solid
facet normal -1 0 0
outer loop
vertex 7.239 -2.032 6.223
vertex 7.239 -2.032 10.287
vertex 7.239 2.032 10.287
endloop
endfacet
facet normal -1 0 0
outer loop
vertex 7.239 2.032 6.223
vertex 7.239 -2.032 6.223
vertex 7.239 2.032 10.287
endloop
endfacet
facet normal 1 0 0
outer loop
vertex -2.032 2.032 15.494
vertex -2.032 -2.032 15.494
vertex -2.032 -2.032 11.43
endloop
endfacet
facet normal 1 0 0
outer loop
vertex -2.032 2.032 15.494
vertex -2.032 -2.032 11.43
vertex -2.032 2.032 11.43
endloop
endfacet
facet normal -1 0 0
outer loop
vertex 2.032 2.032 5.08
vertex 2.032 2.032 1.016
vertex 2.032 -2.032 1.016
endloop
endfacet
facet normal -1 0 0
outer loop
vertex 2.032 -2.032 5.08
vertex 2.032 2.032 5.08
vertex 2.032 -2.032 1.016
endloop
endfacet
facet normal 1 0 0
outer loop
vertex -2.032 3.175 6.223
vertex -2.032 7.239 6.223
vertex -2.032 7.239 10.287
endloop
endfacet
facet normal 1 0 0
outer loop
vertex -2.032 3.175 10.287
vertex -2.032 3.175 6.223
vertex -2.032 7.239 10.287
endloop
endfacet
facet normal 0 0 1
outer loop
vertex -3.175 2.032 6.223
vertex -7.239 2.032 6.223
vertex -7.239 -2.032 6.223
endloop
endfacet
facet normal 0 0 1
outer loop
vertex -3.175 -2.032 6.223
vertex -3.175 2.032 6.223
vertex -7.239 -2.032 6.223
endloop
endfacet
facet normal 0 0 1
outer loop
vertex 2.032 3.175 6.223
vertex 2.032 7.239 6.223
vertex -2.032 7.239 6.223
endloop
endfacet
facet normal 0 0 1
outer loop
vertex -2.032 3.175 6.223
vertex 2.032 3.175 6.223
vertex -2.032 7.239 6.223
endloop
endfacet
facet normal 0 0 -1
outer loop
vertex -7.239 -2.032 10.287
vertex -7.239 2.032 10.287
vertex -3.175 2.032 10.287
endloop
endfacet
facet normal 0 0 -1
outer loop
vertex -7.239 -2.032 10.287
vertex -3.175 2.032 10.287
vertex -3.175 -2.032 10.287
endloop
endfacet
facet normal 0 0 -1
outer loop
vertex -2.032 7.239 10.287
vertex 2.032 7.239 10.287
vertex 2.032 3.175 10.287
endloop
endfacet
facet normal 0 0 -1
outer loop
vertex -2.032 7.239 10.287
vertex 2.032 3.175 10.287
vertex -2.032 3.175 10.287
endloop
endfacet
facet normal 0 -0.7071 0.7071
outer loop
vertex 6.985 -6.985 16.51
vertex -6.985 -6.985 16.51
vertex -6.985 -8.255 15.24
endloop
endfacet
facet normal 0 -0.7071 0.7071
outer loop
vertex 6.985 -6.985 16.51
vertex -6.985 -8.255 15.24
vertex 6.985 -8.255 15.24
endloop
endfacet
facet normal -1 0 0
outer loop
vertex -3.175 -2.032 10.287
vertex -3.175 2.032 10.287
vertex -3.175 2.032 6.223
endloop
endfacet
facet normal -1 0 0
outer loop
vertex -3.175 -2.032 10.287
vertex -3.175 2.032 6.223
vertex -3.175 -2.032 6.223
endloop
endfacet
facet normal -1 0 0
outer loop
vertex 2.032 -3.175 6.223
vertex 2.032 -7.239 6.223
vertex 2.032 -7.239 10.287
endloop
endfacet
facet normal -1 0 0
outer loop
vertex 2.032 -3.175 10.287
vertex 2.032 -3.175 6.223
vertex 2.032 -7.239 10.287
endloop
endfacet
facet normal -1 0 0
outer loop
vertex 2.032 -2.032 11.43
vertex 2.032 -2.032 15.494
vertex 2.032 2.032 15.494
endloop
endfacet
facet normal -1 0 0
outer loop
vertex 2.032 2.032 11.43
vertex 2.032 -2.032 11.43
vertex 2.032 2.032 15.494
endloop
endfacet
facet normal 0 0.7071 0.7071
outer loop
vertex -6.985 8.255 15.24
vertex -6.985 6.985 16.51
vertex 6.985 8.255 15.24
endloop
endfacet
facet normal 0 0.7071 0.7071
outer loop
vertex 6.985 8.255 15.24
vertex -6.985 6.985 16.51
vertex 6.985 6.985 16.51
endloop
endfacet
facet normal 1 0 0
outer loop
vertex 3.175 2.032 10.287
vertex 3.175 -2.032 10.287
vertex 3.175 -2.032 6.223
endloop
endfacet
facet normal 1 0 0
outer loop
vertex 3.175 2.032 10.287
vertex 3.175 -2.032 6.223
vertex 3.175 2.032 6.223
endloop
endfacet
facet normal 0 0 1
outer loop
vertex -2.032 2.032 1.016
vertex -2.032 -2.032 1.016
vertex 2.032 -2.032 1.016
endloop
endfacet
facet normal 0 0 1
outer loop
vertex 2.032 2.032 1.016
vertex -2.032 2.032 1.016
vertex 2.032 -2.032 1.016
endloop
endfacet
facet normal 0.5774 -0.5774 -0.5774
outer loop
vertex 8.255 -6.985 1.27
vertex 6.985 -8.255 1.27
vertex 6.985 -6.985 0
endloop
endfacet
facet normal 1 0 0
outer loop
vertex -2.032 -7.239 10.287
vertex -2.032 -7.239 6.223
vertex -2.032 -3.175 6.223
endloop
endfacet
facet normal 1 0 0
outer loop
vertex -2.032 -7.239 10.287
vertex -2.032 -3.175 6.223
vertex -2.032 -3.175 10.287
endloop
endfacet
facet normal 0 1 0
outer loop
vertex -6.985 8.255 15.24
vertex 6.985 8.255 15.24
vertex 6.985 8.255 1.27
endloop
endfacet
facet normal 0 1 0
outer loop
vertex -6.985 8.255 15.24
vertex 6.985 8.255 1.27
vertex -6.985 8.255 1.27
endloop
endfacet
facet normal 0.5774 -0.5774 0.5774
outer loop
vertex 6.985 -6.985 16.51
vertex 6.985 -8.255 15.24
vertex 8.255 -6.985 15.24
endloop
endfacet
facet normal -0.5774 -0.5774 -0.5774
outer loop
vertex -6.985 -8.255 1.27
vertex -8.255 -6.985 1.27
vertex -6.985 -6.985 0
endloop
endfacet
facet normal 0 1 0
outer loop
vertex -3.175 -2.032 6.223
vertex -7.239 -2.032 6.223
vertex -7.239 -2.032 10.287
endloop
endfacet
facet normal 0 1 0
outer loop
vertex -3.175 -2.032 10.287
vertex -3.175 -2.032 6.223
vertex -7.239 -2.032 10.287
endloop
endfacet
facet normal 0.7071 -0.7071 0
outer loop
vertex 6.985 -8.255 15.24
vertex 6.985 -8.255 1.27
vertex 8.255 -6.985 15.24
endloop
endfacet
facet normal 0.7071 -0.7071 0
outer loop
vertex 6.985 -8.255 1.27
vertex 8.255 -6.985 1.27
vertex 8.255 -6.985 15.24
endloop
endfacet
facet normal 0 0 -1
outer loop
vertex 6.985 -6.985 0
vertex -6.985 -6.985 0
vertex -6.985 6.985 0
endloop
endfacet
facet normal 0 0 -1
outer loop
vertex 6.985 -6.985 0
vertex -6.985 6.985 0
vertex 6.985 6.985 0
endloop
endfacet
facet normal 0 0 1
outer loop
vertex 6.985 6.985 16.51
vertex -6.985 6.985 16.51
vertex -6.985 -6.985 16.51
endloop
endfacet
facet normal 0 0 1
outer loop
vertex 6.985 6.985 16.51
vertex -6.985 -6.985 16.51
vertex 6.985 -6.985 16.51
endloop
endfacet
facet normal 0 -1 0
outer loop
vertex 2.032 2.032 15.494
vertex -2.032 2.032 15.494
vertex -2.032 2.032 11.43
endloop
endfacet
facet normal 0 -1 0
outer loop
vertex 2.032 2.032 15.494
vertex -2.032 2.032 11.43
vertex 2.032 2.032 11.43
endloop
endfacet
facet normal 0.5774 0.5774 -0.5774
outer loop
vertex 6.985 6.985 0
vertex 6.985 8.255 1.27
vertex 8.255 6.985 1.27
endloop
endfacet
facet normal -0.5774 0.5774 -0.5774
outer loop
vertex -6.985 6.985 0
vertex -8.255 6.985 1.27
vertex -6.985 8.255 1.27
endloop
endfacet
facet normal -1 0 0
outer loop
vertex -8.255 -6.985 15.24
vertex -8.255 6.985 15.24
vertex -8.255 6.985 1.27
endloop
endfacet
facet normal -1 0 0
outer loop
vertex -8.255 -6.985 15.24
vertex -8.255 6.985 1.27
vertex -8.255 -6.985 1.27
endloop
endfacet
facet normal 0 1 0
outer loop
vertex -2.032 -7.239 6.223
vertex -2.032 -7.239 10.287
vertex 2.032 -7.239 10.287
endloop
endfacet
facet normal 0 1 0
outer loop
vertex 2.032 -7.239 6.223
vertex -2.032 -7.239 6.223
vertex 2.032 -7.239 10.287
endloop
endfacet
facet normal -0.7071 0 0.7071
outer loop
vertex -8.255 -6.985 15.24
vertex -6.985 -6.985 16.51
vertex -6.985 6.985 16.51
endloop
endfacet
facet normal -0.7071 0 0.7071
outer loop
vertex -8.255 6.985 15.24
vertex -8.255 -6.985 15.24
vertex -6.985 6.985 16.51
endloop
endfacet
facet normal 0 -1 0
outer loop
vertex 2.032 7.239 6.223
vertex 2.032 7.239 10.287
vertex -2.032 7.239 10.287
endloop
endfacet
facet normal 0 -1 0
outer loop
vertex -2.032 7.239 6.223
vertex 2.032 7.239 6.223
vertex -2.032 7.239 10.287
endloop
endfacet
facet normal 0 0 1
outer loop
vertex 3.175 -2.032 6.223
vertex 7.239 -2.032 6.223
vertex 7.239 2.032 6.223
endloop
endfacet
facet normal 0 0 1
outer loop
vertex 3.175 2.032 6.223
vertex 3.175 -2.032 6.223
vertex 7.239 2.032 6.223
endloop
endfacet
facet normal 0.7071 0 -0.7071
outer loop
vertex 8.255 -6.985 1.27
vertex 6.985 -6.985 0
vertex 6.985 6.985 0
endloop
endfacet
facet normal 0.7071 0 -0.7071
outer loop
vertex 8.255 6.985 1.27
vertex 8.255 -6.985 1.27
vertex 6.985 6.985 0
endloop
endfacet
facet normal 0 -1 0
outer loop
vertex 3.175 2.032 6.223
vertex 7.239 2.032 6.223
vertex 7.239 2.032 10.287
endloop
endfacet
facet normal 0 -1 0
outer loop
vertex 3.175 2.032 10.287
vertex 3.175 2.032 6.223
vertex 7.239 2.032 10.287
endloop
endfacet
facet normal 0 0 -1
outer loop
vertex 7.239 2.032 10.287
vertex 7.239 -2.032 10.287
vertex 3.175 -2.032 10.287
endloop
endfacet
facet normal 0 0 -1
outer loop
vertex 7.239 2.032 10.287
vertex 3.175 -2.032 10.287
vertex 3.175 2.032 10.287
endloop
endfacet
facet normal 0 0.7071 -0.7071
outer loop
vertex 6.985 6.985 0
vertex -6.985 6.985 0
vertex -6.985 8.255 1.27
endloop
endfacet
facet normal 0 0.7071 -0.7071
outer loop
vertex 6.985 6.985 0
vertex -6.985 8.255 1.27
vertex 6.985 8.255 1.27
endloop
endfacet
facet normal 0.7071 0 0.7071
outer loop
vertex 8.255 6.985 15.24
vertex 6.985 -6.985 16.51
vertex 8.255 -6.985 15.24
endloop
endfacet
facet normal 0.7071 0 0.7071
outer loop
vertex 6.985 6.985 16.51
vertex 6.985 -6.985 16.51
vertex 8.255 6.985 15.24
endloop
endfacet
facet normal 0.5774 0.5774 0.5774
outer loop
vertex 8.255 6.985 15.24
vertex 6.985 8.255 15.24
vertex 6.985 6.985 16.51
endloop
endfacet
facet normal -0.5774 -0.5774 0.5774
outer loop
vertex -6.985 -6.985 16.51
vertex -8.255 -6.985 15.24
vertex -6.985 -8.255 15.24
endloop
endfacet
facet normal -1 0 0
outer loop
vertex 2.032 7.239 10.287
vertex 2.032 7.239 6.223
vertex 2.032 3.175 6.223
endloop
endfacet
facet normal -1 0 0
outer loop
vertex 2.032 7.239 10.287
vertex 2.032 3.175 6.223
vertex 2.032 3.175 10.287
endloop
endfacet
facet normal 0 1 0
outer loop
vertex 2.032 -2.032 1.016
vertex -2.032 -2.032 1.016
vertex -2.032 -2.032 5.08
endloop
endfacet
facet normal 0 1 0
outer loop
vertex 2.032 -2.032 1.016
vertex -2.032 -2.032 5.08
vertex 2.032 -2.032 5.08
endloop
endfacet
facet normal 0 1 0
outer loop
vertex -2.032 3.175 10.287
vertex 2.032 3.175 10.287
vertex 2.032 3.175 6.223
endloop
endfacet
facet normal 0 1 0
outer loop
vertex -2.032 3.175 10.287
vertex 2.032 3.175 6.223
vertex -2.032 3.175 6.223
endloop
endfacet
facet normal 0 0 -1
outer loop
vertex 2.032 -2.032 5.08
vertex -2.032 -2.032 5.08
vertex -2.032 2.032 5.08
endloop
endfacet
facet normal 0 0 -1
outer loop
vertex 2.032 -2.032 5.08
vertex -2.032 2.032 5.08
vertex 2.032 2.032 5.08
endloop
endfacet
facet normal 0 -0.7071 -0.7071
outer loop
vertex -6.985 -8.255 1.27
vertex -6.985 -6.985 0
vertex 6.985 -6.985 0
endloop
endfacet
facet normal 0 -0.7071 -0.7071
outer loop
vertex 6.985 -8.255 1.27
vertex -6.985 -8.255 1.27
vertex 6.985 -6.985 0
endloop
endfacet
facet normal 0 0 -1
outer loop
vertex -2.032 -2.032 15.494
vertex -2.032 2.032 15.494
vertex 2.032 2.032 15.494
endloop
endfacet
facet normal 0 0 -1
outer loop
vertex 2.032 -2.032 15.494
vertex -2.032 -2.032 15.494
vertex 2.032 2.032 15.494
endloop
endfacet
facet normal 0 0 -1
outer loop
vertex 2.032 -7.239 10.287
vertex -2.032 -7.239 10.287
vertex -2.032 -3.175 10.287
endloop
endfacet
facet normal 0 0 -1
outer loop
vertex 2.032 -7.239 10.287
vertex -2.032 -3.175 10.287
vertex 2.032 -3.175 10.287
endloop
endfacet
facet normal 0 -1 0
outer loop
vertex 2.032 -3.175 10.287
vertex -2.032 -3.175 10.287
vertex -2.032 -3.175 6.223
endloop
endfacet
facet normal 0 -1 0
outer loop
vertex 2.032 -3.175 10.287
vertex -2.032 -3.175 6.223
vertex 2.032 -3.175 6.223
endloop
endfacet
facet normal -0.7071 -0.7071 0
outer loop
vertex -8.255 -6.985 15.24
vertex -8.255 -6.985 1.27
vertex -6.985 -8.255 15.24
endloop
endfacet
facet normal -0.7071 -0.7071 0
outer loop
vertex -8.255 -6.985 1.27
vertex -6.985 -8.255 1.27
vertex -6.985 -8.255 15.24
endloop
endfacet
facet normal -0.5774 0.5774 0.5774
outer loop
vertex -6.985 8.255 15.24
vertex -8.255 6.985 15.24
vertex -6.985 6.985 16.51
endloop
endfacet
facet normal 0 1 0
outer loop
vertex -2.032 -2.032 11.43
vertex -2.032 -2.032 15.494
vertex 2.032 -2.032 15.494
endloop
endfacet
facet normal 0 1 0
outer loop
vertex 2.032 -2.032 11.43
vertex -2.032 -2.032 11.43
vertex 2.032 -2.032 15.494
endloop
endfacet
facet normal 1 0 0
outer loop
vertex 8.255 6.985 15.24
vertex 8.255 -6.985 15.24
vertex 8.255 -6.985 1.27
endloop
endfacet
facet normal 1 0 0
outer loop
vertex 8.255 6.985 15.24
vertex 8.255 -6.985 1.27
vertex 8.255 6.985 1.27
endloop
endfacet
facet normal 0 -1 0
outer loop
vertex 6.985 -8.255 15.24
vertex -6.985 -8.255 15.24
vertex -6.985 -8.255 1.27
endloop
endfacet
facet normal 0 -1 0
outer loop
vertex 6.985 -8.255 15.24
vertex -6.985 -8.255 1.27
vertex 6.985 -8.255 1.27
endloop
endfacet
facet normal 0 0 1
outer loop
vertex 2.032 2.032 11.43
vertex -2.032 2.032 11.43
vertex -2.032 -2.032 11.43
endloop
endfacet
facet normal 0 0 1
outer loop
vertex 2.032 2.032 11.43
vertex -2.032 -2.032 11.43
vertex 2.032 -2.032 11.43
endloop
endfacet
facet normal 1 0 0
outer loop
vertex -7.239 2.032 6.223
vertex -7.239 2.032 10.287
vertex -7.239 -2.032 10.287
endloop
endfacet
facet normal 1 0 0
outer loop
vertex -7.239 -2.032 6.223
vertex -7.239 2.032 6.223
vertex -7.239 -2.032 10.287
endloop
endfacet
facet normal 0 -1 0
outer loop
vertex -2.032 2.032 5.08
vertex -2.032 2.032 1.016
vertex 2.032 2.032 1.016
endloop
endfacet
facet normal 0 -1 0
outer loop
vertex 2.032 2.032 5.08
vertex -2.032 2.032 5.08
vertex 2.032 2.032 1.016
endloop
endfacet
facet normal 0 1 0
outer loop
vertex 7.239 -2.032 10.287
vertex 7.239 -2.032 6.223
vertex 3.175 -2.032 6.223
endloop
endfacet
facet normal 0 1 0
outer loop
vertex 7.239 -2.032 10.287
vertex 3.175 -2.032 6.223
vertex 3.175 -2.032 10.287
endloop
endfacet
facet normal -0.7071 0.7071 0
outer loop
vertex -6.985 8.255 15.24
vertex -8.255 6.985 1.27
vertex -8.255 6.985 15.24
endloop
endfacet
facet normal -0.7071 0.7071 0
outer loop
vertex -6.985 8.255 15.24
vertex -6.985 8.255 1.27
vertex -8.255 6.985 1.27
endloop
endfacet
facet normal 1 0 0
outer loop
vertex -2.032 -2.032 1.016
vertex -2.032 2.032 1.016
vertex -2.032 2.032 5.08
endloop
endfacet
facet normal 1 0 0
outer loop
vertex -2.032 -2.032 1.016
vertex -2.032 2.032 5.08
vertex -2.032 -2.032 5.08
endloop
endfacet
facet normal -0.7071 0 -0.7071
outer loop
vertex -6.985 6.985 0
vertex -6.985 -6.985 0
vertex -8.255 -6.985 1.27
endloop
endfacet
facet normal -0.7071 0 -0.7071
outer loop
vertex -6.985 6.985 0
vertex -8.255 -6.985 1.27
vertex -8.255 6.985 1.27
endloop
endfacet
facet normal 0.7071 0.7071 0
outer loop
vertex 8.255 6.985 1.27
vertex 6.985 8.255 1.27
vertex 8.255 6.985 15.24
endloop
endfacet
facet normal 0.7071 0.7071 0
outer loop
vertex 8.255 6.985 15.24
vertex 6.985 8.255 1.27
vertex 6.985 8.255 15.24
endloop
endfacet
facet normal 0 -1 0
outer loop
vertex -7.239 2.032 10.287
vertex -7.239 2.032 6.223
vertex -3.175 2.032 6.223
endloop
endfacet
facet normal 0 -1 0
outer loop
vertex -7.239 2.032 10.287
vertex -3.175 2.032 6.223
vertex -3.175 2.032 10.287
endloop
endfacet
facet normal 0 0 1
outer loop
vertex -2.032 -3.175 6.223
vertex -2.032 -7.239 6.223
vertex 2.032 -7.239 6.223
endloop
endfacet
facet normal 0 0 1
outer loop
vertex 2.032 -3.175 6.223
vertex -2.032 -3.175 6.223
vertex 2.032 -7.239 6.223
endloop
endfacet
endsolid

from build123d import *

# Parameters (mm, degrees)
F0_W      = 16.51
F0_H      = 16.51
F1_DEPTH  = 16.51
F2_SIZE   = 1.27
F3_W      = 4.064
F3_H      = 4.064
F4_DEPTH  = 5.08
F5_W      = 4.064
F5_H      = 4.064
F6_DEPTH  = 5.08
F7_W      = 4.064
F7_H      = 4.064
F8_DEPTH  = 5.08
F9_W      = 4.064
F9_H      = 4.064
F10_DEPTH = 5.08
F11_W     = 4.064
F11_H     = 4.064
F12_DEPTH = 5.08
F13_W     = 4.064
F13_H     = 4.064
F14_DEPTH = 5.08
F15_DEPTH = 1.016
F16_DEPTH = 1.016
F17_DEPTH = 1.016
F18_DEPTH = 1.016
F19_DEPTH = 1.016
F20_DEPTH = 1.016


with BuildPart() as f1:
    # F0 (on Top) → F1 (new body)
    with BuildSketch(Plane.XY):
        Rectangle(F0_W, F0_H)
    extrude(amount=F1_DEPTH)

    # F2
    f2_edges = [f1.edges().sort_by_distance(p)[0] for p in [
        (-8.255, 8.255, 8.255),
        (-8.255, -8.255, 8.255),
        (-8.255, 0, 0),
        (-8.255, 0, 16.51),
        (8.255, -8.255, 8.255),
        (0, -8.255, 16.51),
        (0, -8.255, 0),
        (8.255, 8.255, 8.255),
        (0, 8.255, 0),
        (0, 8.255, 16.51),
        (8.255, 0, 0),
        (8.255, 0, 16.51),
    ]]
    chamfer(f2_edges, length=F2_SIZE)

    # F3 (on face) → F4 (cut)
    with BuildSketch(Plane(origin=(0, 8.255, 0), x_dir=(-1, 0, 0), z_dir=(0, 1, 0))):
        with Locations((0, 8.255)):
            Rectangle(F3_W, F3_H)
    extrude(amount=-F4_DEPTH, mode=Mode.SUBTRACT)

    # F5 (on face) → F6 (cut)
    with BuildSketch(Plane.YZ.offset(8.255)):
        with Locations((0, 8.255)):
            Rectangle(F5_W, F5_H)
    extrude(amount=-F6_DEPTH, mode=Mode.SUBTRACT)

    # F7 (on face) → F8 (cut)
    with BuildSketch(Plane(origin=(-8.255, 0, 0), x_dir=(0, -1, 0), z_dir=(-1, 0, 0))):
        with Locations((0, 8.255)):
            Rectangle(F7_W, F7_H)
    extrude(amount=-F8_DEPTH, mode=Mode.SUBTRACT)

    # F9 (on face) → F10 (cut)
    with BuildSketch(Plane.XZ.offset(8.255)):
        with Locations((0, 8.255)):
            Rectangle(F9_W, F9_H)
    extrude(amount=-F10_DEPTH, mode=Mode.SUBTRACT)

    # F11 (on face) → F12 (cut)
    with BuildSketch(Plane.XY.offset(16.51)):
        Rectangle(F11_W, F11_H)
    extrude(amount=-F12_DEPTH, mode=Mode.SUBTRACT)

    # F13 (on face) → F14 (cut)
    with BuildSketch(Plane(origin=(0, 0, 0), x_dir=(1, 0, 0), z_dir=(0, 0, -1))):
        Rectangle(F13_W, F13_H)
    extrude(amount=-F14_DEPTH, mode=Mode.SUBTRACT)

    # F3 (on face) → F15 (join)
    with BuildSketch(Plane(origin=(0, 8.255, 0), x_dir=(-1, 0, 0), z_dir=(0, 1, 0))):
        with Locations((0, 8.255)):
            Rectangle(F3_W, F3_H)
    extrude(amount=-F15_DEPTH)

    # F5 (on face) → F16 (join)
    with BuildSketch(Plane.YZ.offset(8.255)):
        with Locations((0, 8.255)):
            Rectangle(F5_W, F5_H)
    extrude(amount=-F16_DEPTH)

    # F7 (on face) → F17 (join)
    with BuildSketch(Plane(origin=(-8.255, 0, 0), x_dir=(0, -1, 0), z_dir=(-1, 0, 0))):
        with Locations((0, 8.255)):
            Rectangle(F7_W, F7_H)
    extrude(amount=-F17_DEPTH)

    # F9 (on face) → F18 (join)
    with BuildSketch(Plane.XZ.offset(8.255)):
        with Locations((0, 8.255)):
            Rectangle(F9_W, F9_H)
    extrude(amount=-F18_DEPTH)

    # F11 (on face) → F19 (join)
    with BuildSketch(Plane.XY.offset(16.51)):
        Rectangle(F11_W, F11_H)
    extrude(amount=-F19_DEPTH)

    # F13 (on face) → F20 (join)
    with BuildSketch(Plane(origin=(0, 0, 0), x_dir=(1, 0, 0), z_dir=(0, 0, -1))):
        Rectangle(F13_W, F13_H)
    extrude(amount=-F20_DEPTH)


solid = f1.part
